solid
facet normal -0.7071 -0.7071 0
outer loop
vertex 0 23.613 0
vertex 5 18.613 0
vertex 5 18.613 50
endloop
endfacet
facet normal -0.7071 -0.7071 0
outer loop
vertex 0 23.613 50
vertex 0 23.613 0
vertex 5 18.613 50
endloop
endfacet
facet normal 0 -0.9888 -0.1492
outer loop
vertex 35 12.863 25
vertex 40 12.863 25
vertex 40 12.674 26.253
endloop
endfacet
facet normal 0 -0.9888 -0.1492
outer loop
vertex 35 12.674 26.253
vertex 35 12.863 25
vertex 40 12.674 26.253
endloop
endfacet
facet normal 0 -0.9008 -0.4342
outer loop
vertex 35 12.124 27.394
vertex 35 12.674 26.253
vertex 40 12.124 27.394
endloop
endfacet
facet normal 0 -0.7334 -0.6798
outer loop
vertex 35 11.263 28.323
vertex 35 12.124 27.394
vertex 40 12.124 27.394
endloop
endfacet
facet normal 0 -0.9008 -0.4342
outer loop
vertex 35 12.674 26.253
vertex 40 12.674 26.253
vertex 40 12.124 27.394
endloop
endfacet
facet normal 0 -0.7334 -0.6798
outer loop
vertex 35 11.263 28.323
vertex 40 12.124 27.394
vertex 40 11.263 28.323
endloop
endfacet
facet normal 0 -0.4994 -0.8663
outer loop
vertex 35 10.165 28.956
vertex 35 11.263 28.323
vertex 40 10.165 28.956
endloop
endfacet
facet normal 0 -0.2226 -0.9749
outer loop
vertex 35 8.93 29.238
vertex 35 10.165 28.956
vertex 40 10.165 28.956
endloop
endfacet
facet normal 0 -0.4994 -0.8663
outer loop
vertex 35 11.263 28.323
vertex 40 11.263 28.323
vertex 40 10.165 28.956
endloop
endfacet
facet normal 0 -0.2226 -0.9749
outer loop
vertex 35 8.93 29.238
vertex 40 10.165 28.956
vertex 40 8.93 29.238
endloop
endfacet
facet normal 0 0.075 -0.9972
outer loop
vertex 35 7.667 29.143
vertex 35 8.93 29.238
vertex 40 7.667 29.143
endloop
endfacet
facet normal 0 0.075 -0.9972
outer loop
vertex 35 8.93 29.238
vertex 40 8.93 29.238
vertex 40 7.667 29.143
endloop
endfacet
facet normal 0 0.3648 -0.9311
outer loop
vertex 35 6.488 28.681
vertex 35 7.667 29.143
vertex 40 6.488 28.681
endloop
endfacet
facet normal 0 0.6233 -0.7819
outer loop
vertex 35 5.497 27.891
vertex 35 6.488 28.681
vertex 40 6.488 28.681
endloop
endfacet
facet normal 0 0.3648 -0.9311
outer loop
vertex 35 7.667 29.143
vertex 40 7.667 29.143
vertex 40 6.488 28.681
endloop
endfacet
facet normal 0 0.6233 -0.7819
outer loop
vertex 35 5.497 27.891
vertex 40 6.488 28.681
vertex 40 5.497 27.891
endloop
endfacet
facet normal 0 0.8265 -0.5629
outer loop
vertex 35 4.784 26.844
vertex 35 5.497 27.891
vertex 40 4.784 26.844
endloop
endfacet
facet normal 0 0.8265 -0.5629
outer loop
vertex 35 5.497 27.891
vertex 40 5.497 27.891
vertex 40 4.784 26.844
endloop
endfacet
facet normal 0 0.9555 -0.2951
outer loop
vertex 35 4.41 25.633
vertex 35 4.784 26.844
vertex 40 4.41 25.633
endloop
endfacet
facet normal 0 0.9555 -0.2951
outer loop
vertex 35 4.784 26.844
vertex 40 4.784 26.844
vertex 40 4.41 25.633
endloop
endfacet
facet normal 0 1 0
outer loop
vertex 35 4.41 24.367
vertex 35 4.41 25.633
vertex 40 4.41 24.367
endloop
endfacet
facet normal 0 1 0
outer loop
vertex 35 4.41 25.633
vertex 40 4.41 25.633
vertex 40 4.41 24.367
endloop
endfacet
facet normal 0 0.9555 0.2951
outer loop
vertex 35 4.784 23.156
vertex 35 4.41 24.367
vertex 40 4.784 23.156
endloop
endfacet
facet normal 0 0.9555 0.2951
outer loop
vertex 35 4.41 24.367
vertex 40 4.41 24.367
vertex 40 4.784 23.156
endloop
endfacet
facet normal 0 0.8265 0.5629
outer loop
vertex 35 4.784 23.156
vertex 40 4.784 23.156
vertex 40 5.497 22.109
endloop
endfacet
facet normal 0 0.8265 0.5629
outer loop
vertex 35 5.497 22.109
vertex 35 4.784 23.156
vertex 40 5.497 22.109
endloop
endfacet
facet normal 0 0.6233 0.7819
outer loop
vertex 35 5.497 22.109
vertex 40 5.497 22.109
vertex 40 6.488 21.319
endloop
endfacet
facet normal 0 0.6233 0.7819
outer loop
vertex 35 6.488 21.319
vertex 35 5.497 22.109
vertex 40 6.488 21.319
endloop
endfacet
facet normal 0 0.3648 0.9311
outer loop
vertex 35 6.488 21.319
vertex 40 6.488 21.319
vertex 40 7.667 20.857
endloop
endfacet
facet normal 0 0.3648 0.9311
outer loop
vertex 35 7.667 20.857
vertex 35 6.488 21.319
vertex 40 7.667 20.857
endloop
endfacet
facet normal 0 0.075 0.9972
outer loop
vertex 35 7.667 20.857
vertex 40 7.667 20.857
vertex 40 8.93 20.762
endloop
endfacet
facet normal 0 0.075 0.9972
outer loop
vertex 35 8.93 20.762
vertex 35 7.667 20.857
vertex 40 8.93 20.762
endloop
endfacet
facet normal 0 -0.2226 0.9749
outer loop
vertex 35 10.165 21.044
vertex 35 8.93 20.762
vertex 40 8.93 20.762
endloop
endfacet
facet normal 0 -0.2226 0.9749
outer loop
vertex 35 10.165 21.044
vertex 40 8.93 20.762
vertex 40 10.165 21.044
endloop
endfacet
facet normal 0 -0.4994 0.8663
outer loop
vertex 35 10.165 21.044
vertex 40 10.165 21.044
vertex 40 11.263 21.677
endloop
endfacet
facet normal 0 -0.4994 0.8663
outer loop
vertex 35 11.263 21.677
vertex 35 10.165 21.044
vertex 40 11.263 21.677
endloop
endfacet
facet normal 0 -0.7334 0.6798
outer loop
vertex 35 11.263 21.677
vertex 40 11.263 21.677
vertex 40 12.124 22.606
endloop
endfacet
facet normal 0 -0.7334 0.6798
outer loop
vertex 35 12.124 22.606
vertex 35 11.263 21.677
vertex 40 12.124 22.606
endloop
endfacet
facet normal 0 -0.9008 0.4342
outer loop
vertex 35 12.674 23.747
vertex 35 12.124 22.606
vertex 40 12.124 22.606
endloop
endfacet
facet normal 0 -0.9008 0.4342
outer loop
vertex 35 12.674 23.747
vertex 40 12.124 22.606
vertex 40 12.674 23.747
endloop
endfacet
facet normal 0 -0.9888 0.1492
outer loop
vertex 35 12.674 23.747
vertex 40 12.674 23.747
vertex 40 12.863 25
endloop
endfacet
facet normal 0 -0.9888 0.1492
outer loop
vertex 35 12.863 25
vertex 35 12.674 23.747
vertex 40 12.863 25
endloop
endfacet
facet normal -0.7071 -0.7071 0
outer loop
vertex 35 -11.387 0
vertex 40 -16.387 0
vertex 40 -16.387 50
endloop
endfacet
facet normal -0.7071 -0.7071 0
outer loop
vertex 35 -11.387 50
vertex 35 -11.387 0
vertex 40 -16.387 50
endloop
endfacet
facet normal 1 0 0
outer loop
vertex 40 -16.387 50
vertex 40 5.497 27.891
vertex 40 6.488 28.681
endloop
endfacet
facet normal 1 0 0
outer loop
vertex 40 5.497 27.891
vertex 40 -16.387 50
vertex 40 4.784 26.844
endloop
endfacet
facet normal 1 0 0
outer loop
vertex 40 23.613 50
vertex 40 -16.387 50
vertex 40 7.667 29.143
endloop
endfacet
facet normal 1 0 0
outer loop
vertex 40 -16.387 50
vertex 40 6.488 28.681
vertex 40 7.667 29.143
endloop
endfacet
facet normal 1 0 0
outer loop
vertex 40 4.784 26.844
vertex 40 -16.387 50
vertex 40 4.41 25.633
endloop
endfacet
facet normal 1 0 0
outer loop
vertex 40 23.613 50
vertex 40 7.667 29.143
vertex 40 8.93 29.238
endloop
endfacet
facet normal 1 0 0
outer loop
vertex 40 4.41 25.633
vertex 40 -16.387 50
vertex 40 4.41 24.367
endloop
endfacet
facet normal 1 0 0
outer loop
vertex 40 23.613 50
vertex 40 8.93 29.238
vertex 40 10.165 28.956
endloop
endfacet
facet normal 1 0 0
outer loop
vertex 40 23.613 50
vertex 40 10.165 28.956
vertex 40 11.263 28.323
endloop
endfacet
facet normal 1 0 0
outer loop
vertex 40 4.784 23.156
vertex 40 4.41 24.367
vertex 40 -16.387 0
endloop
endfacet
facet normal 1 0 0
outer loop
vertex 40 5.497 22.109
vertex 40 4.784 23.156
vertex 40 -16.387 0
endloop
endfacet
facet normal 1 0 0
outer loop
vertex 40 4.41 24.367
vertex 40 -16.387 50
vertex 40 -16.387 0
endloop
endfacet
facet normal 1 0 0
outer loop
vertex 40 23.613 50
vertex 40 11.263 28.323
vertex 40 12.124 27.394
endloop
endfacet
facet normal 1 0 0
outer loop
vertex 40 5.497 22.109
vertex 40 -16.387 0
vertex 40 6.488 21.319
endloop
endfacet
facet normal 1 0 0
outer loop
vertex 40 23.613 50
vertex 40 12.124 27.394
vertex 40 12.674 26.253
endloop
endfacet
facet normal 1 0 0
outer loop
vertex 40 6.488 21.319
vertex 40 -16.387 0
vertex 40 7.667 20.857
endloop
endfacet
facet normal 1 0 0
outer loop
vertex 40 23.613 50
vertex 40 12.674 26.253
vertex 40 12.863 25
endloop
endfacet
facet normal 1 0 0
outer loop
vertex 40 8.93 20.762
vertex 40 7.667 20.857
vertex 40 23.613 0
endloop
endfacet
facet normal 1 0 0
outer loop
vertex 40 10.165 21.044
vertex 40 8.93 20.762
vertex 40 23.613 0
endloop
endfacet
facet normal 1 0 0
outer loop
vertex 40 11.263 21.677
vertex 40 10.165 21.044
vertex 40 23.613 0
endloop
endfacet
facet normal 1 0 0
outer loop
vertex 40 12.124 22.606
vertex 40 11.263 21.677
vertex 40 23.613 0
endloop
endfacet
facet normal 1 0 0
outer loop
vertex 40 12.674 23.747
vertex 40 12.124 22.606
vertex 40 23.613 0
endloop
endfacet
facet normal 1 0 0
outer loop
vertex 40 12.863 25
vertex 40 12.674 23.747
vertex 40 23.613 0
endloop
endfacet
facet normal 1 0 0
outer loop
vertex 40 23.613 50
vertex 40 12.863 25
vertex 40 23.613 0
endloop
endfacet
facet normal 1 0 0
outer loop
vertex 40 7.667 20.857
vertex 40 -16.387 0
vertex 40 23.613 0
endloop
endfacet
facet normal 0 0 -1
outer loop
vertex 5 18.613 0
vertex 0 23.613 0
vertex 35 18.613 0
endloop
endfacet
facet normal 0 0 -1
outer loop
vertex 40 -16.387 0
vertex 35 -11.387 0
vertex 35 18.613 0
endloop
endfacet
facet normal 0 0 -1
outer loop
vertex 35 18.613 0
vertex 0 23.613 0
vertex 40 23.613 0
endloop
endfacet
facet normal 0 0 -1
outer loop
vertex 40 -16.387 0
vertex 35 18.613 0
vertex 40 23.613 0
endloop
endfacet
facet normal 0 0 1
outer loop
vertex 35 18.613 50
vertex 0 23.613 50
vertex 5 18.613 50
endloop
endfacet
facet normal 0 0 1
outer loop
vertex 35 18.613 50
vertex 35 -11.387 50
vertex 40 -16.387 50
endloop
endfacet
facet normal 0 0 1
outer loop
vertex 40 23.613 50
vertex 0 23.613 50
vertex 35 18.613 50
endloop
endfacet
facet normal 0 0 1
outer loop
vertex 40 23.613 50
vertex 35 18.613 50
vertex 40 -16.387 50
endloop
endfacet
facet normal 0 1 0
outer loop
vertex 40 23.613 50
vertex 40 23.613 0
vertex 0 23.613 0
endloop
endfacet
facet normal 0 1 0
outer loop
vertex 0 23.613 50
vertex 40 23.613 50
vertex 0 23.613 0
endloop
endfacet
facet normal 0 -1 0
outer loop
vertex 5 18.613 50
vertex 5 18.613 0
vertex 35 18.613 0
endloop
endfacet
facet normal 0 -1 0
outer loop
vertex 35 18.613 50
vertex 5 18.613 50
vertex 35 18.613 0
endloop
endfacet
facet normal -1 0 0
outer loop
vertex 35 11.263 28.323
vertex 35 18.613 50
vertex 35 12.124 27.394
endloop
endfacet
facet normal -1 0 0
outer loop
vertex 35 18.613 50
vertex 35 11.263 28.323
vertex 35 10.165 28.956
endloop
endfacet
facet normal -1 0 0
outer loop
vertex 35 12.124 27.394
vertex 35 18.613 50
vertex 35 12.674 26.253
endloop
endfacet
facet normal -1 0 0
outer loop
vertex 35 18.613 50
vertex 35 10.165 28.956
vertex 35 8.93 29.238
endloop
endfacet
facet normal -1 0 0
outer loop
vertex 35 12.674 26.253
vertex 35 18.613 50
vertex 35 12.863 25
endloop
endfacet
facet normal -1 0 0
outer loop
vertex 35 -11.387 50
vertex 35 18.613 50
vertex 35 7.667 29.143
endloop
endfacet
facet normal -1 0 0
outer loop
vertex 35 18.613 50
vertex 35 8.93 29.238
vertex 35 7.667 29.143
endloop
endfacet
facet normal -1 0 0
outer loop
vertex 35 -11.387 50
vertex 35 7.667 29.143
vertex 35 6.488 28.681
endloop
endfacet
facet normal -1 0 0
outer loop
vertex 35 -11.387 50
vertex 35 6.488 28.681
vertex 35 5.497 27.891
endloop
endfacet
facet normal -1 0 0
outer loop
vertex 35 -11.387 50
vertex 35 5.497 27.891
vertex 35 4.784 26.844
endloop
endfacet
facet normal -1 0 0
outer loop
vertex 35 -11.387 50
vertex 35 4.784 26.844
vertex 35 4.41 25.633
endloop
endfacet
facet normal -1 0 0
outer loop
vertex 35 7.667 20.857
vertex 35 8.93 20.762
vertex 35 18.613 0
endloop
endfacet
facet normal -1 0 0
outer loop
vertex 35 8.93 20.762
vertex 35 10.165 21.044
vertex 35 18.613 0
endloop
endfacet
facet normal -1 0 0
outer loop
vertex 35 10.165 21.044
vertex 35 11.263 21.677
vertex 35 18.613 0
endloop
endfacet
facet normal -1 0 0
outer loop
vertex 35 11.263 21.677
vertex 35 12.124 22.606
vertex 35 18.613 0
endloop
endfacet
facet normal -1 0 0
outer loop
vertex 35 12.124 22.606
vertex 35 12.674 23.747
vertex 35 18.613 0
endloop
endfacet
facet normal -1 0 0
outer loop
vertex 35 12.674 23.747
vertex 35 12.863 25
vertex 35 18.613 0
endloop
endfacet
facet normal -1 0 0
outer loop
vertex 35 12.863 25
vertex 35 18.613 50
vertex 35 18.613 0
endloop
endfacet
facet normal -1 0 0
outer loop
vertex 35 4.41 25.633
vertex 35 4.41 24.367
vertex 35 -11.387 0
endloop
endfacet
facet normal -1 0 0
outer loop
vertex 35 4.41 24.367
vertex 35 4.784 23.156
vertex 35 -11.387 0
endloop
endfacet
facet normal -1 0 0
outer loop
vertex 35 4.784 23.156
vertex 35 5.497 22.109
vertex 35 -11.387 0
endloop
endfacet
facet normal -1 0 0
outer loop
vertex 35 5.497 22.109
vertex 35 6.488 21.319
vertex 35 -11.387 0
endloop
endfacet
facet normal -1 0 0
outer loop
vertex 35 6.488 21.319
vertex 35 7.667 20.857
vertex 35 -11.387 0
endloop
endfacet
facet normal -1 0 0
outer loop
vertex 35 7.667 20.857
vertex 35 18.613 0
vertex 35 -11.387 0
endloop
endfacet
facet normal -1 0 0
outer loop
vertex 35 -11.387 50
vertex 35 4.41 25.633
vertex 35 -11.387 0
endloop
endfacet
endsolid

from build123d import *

# Parameters (mm, degrees)
F1_DEPTH = 50
F2_SIZE  = 4.99999
F3_R     = 4.25
F4_DEPTH = 25


# Not quite as in the source:
# - a fillet or chamfer is up to 0.001 mm smaller than in the source, because OpenCascade refuses the exact size


with BuildPart() as f1:
    # F0 (on Top) → F1 (new body)
    with BuildSketch(Plane.XY):
        Polygon((40, 23.61271578), (0, 23.61271578), (0, 18.61271578), (35, 18.61271578), (35, -16.38728422), (40, -16.38728422), align=None)
    extrude(amount=F1_DEPTH)

    # F2 (size 5 in the source; OpenCascade refuses exactly that, so slightly less here)
    f2_edges = [f1.edges().sort_by_distance(p)[0] for p in [
        (0, 18.612716, 25),
        (35, -16.387284, 25),
    ]]
    chamfer(f2_edges, length=F2_SIZE)

    # F3 (on face) → F4 (cut)
    with BuildSketch(Plane.YZ.offset(40)):
        with Locations((8.61271578, 25)):
            Circle(F3_R)
    extrude(amount=-F4_DEPTH, mode=Mode.SUBTRACT)


solid = f1.part
